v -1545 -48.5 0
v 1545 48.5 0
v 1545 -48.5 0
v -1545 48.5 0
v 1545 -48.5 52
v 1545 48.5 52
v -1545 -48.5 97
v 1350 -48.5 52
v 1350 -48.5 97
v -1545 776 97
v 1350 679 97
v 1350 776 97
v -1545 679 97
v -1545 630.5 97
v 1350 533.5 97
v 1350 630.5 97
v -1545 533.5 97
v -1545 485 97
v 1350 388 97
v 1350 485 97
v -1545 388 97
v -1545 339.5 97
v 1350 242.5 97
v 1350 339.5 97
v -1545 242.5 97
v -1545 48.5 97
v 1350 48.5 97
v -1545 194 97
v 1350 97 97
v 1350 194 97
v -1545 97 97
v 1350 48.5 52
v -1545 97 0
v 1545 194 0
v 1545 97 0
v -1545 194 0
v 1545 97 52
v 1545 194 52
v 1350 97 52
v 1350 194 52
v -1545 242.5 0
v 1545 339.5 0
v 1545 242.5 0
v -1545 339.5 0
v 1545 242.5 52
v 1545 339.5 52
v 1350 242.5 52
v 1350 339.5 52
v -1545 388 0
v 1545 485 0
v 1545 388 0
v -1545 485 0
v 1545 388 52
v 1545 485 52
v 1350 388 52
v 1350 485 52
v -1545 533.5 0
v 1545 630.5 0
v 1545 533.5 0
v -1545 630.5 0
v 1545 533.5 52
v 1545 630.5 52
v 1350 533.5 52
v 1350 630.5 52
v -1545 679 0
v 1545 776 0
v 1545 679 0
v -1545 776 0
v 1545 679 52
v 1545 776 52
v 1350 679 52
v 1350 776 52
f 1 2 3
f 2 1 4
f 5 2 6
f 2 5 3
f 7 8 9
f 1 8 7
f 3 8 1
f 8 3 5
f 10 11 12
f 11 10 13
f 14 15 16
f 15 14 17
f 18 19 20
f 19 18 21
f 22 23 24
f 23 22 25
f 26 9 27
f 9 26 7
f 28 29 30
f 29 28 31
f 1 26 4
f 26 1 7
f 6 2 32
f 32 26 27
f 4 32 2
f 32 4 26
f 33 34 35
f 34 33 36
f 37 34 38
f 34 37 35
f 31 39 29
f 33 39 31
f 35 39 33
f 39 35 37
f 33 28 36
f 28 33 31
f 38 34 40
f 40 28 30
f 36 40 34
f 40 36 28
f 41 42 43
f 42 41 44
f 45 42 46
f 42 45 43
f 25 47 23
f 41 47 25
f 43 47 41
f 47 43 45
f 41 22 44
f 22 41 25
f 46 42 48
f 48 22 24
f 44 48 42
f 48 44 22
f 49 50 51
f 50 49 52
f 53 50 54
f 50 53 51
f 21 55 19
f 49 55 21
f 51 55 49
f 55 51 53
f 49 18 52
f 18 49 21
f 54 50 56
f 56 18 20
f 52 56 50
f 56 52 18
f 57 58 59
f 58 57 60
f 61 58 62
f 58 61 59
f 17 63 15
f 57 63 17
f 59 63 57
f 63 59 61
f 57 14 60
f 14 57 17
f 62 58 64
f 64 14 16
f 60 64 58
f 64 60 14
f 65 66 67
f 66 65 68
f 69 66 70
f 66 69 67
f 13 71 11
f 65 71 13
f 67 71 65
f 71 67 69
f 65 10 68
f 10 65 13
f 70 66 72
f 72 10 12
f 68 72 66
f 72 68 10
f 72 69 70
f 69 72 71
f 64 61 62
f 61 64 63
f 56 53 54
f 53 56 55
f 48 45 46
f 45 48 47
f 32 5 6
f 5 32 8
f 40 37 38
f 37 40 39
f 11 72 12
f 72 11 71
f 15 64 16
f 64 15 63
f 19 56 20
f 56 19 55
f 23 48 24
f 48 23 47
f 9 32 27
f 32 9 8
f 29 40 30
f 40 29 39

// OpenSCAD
difference()
{
    union()
    {
        union()
        {
            union()
            {
                union()
                {
                    union()
                    {
                        linear_extrude(height = 97.0, twist = 0.0, scale = 1.0, slices = 1, center = false)
                        {
                            scale([3090.0, 97.0])
                            {
                                M52();
                            }
                        }
                        translate([0.0, 145.5, 0.0])
                        {
                            linear_extrude(height = 97.0, twist = 0.0, scale = 1.0, slices = 1, center = false)
                            {
                                scale([3090.0, 97.0])
                                {
                                    M52();
                                }
                            }
                        }
                    }
                    translate([0.0, 291.0, 0.0])
                    {
                        linear_extrude(height = 97.0, twist = 0.0, scale = 1.0, slices = 1, center = false)
                        {
                            scale([3090.0, 97.0])
                            {
                                M52();
                            }
                        }
                    }
                }
                translate([0.0, 436.5, 0.0])
                {
                    linear_extrude(height = 97.0, twist = 0.0, scale = 1.0, slices = 1, center = false)
                    {
                        scale([3090.0, 97.0])
                        {
                            M52();
                        }
                    }
                }
            }
            translate([0.0, 582.0, 0.0])
            {
                linear_extrude(height = 97.0, twist = 0.0, scale = 1.0, slices = 1, center = false)
                {
                    scale([3090.0, 97.0])
                    {
                        M52();
                    }
                }
            }
        }
        translate([0.0, 727.5, 0.0])
        {
            linear_extrude(height = 97.0, twist = 0.0, scale = 1.0, slices = 1, center = false)
            {
                scale([3090.0, 97.0])
                {
                    M52();
                }
            }
        }
    }
    union()
    {
        union()
        {
            union()
            {
                union()
                {
                    union()
                    {
                        translate([0.0, 0.0, 52.0])
                        {
                            translate([1545.0, 0.0, 0.0])
                            {
                                linear_extrude(height = 45.0, twist = 0.0, scale = 1.0, slices = 1, center = false)
                                {
                                    scale([390.0, 145.5])
                                    {
                                        M52();
                                    }
                                }
                            }
                        }
                        translate([0.0, 145.5, 0.0])
                        {
                            translate([0.0, 0.0, 52.0])
                            {
                                translate([1545.0, 0.0, 0.0])
                                {
                                    linear_extrude(height = 45.0, twist = 0.0, scale = 1.0, slices = 1, center = false)
                                    {
                                        scale([390.0, 145.5])
                                        {
                                            M52();
                                        }
                                    }
                                }
                            }
                        }
                    }
                    translate([0.0, 291.0, 0.0])
                    {
                        translate([0.0, 0.0, 52.0])
                        {
                            translate([1545.0, 0.0, 0.0])
                            {
                                linear_extrude(height = 45.0, twist = 0.0, scale = 1.0, slices = 1, center = false)
                                {
                                    scale([390.0, 145.5])
                                    {
                                        M52();
                                    }
                                }
                            }
                        }
                    }
                }
                translate([0.0, 436.5, 0.0])
                {
                    translate([0.0, 0.0, 52.0])
                    {
                        translate([1545.0, 0.0, 0.0])
                        {
                            linear_extrude(height = 45.0, twist = 0.0, scale = 1.0, slices = 1, center = false)
                            {
                                scale([390.0, 145.5])
                                {
                                    M52();
                                }
                            }
                        }
                    }
                }
            }
            translate([0.0, 582.0, 0.0])
            {
                translate([0.0, 0.0, 52.0])
                {
                    translate([1545.0, 0.0, 0.0])
                    {
                        linear_extrude(height = 45.0, twist = 0.0, scale = 1.0, slices = 1, center = false)
                        {
                            scale([390.0, 145.5])
                            {
                                M52();
                            }
                        }
                    }
                }
            }
        }
        translate([0.0, 727.5, 0.0])
        {
            translate([0.0, 0.0, 52.0])
            {
                translate([1545.0, 0.0, 0.0])
                {
                    linear_extrude(height = 45.0, twist = 0.0, scale = 1.0, slices = 1, center = false)
                    {
                        scale([390.0, 145.5])
                        {
                            M52();
                        }
                    }
                }
            }
        }
    }
}

module M52()
{
    polygon
    (
        points =
        [
            [-0.5, -0.5], 
            [0.5, -0.5], 
            [0.5, 0.5], 
            [-0.5, 0.5]
        ],
        paths =
        [
            [0, 1, 2, 3]
        ]
    );
}
